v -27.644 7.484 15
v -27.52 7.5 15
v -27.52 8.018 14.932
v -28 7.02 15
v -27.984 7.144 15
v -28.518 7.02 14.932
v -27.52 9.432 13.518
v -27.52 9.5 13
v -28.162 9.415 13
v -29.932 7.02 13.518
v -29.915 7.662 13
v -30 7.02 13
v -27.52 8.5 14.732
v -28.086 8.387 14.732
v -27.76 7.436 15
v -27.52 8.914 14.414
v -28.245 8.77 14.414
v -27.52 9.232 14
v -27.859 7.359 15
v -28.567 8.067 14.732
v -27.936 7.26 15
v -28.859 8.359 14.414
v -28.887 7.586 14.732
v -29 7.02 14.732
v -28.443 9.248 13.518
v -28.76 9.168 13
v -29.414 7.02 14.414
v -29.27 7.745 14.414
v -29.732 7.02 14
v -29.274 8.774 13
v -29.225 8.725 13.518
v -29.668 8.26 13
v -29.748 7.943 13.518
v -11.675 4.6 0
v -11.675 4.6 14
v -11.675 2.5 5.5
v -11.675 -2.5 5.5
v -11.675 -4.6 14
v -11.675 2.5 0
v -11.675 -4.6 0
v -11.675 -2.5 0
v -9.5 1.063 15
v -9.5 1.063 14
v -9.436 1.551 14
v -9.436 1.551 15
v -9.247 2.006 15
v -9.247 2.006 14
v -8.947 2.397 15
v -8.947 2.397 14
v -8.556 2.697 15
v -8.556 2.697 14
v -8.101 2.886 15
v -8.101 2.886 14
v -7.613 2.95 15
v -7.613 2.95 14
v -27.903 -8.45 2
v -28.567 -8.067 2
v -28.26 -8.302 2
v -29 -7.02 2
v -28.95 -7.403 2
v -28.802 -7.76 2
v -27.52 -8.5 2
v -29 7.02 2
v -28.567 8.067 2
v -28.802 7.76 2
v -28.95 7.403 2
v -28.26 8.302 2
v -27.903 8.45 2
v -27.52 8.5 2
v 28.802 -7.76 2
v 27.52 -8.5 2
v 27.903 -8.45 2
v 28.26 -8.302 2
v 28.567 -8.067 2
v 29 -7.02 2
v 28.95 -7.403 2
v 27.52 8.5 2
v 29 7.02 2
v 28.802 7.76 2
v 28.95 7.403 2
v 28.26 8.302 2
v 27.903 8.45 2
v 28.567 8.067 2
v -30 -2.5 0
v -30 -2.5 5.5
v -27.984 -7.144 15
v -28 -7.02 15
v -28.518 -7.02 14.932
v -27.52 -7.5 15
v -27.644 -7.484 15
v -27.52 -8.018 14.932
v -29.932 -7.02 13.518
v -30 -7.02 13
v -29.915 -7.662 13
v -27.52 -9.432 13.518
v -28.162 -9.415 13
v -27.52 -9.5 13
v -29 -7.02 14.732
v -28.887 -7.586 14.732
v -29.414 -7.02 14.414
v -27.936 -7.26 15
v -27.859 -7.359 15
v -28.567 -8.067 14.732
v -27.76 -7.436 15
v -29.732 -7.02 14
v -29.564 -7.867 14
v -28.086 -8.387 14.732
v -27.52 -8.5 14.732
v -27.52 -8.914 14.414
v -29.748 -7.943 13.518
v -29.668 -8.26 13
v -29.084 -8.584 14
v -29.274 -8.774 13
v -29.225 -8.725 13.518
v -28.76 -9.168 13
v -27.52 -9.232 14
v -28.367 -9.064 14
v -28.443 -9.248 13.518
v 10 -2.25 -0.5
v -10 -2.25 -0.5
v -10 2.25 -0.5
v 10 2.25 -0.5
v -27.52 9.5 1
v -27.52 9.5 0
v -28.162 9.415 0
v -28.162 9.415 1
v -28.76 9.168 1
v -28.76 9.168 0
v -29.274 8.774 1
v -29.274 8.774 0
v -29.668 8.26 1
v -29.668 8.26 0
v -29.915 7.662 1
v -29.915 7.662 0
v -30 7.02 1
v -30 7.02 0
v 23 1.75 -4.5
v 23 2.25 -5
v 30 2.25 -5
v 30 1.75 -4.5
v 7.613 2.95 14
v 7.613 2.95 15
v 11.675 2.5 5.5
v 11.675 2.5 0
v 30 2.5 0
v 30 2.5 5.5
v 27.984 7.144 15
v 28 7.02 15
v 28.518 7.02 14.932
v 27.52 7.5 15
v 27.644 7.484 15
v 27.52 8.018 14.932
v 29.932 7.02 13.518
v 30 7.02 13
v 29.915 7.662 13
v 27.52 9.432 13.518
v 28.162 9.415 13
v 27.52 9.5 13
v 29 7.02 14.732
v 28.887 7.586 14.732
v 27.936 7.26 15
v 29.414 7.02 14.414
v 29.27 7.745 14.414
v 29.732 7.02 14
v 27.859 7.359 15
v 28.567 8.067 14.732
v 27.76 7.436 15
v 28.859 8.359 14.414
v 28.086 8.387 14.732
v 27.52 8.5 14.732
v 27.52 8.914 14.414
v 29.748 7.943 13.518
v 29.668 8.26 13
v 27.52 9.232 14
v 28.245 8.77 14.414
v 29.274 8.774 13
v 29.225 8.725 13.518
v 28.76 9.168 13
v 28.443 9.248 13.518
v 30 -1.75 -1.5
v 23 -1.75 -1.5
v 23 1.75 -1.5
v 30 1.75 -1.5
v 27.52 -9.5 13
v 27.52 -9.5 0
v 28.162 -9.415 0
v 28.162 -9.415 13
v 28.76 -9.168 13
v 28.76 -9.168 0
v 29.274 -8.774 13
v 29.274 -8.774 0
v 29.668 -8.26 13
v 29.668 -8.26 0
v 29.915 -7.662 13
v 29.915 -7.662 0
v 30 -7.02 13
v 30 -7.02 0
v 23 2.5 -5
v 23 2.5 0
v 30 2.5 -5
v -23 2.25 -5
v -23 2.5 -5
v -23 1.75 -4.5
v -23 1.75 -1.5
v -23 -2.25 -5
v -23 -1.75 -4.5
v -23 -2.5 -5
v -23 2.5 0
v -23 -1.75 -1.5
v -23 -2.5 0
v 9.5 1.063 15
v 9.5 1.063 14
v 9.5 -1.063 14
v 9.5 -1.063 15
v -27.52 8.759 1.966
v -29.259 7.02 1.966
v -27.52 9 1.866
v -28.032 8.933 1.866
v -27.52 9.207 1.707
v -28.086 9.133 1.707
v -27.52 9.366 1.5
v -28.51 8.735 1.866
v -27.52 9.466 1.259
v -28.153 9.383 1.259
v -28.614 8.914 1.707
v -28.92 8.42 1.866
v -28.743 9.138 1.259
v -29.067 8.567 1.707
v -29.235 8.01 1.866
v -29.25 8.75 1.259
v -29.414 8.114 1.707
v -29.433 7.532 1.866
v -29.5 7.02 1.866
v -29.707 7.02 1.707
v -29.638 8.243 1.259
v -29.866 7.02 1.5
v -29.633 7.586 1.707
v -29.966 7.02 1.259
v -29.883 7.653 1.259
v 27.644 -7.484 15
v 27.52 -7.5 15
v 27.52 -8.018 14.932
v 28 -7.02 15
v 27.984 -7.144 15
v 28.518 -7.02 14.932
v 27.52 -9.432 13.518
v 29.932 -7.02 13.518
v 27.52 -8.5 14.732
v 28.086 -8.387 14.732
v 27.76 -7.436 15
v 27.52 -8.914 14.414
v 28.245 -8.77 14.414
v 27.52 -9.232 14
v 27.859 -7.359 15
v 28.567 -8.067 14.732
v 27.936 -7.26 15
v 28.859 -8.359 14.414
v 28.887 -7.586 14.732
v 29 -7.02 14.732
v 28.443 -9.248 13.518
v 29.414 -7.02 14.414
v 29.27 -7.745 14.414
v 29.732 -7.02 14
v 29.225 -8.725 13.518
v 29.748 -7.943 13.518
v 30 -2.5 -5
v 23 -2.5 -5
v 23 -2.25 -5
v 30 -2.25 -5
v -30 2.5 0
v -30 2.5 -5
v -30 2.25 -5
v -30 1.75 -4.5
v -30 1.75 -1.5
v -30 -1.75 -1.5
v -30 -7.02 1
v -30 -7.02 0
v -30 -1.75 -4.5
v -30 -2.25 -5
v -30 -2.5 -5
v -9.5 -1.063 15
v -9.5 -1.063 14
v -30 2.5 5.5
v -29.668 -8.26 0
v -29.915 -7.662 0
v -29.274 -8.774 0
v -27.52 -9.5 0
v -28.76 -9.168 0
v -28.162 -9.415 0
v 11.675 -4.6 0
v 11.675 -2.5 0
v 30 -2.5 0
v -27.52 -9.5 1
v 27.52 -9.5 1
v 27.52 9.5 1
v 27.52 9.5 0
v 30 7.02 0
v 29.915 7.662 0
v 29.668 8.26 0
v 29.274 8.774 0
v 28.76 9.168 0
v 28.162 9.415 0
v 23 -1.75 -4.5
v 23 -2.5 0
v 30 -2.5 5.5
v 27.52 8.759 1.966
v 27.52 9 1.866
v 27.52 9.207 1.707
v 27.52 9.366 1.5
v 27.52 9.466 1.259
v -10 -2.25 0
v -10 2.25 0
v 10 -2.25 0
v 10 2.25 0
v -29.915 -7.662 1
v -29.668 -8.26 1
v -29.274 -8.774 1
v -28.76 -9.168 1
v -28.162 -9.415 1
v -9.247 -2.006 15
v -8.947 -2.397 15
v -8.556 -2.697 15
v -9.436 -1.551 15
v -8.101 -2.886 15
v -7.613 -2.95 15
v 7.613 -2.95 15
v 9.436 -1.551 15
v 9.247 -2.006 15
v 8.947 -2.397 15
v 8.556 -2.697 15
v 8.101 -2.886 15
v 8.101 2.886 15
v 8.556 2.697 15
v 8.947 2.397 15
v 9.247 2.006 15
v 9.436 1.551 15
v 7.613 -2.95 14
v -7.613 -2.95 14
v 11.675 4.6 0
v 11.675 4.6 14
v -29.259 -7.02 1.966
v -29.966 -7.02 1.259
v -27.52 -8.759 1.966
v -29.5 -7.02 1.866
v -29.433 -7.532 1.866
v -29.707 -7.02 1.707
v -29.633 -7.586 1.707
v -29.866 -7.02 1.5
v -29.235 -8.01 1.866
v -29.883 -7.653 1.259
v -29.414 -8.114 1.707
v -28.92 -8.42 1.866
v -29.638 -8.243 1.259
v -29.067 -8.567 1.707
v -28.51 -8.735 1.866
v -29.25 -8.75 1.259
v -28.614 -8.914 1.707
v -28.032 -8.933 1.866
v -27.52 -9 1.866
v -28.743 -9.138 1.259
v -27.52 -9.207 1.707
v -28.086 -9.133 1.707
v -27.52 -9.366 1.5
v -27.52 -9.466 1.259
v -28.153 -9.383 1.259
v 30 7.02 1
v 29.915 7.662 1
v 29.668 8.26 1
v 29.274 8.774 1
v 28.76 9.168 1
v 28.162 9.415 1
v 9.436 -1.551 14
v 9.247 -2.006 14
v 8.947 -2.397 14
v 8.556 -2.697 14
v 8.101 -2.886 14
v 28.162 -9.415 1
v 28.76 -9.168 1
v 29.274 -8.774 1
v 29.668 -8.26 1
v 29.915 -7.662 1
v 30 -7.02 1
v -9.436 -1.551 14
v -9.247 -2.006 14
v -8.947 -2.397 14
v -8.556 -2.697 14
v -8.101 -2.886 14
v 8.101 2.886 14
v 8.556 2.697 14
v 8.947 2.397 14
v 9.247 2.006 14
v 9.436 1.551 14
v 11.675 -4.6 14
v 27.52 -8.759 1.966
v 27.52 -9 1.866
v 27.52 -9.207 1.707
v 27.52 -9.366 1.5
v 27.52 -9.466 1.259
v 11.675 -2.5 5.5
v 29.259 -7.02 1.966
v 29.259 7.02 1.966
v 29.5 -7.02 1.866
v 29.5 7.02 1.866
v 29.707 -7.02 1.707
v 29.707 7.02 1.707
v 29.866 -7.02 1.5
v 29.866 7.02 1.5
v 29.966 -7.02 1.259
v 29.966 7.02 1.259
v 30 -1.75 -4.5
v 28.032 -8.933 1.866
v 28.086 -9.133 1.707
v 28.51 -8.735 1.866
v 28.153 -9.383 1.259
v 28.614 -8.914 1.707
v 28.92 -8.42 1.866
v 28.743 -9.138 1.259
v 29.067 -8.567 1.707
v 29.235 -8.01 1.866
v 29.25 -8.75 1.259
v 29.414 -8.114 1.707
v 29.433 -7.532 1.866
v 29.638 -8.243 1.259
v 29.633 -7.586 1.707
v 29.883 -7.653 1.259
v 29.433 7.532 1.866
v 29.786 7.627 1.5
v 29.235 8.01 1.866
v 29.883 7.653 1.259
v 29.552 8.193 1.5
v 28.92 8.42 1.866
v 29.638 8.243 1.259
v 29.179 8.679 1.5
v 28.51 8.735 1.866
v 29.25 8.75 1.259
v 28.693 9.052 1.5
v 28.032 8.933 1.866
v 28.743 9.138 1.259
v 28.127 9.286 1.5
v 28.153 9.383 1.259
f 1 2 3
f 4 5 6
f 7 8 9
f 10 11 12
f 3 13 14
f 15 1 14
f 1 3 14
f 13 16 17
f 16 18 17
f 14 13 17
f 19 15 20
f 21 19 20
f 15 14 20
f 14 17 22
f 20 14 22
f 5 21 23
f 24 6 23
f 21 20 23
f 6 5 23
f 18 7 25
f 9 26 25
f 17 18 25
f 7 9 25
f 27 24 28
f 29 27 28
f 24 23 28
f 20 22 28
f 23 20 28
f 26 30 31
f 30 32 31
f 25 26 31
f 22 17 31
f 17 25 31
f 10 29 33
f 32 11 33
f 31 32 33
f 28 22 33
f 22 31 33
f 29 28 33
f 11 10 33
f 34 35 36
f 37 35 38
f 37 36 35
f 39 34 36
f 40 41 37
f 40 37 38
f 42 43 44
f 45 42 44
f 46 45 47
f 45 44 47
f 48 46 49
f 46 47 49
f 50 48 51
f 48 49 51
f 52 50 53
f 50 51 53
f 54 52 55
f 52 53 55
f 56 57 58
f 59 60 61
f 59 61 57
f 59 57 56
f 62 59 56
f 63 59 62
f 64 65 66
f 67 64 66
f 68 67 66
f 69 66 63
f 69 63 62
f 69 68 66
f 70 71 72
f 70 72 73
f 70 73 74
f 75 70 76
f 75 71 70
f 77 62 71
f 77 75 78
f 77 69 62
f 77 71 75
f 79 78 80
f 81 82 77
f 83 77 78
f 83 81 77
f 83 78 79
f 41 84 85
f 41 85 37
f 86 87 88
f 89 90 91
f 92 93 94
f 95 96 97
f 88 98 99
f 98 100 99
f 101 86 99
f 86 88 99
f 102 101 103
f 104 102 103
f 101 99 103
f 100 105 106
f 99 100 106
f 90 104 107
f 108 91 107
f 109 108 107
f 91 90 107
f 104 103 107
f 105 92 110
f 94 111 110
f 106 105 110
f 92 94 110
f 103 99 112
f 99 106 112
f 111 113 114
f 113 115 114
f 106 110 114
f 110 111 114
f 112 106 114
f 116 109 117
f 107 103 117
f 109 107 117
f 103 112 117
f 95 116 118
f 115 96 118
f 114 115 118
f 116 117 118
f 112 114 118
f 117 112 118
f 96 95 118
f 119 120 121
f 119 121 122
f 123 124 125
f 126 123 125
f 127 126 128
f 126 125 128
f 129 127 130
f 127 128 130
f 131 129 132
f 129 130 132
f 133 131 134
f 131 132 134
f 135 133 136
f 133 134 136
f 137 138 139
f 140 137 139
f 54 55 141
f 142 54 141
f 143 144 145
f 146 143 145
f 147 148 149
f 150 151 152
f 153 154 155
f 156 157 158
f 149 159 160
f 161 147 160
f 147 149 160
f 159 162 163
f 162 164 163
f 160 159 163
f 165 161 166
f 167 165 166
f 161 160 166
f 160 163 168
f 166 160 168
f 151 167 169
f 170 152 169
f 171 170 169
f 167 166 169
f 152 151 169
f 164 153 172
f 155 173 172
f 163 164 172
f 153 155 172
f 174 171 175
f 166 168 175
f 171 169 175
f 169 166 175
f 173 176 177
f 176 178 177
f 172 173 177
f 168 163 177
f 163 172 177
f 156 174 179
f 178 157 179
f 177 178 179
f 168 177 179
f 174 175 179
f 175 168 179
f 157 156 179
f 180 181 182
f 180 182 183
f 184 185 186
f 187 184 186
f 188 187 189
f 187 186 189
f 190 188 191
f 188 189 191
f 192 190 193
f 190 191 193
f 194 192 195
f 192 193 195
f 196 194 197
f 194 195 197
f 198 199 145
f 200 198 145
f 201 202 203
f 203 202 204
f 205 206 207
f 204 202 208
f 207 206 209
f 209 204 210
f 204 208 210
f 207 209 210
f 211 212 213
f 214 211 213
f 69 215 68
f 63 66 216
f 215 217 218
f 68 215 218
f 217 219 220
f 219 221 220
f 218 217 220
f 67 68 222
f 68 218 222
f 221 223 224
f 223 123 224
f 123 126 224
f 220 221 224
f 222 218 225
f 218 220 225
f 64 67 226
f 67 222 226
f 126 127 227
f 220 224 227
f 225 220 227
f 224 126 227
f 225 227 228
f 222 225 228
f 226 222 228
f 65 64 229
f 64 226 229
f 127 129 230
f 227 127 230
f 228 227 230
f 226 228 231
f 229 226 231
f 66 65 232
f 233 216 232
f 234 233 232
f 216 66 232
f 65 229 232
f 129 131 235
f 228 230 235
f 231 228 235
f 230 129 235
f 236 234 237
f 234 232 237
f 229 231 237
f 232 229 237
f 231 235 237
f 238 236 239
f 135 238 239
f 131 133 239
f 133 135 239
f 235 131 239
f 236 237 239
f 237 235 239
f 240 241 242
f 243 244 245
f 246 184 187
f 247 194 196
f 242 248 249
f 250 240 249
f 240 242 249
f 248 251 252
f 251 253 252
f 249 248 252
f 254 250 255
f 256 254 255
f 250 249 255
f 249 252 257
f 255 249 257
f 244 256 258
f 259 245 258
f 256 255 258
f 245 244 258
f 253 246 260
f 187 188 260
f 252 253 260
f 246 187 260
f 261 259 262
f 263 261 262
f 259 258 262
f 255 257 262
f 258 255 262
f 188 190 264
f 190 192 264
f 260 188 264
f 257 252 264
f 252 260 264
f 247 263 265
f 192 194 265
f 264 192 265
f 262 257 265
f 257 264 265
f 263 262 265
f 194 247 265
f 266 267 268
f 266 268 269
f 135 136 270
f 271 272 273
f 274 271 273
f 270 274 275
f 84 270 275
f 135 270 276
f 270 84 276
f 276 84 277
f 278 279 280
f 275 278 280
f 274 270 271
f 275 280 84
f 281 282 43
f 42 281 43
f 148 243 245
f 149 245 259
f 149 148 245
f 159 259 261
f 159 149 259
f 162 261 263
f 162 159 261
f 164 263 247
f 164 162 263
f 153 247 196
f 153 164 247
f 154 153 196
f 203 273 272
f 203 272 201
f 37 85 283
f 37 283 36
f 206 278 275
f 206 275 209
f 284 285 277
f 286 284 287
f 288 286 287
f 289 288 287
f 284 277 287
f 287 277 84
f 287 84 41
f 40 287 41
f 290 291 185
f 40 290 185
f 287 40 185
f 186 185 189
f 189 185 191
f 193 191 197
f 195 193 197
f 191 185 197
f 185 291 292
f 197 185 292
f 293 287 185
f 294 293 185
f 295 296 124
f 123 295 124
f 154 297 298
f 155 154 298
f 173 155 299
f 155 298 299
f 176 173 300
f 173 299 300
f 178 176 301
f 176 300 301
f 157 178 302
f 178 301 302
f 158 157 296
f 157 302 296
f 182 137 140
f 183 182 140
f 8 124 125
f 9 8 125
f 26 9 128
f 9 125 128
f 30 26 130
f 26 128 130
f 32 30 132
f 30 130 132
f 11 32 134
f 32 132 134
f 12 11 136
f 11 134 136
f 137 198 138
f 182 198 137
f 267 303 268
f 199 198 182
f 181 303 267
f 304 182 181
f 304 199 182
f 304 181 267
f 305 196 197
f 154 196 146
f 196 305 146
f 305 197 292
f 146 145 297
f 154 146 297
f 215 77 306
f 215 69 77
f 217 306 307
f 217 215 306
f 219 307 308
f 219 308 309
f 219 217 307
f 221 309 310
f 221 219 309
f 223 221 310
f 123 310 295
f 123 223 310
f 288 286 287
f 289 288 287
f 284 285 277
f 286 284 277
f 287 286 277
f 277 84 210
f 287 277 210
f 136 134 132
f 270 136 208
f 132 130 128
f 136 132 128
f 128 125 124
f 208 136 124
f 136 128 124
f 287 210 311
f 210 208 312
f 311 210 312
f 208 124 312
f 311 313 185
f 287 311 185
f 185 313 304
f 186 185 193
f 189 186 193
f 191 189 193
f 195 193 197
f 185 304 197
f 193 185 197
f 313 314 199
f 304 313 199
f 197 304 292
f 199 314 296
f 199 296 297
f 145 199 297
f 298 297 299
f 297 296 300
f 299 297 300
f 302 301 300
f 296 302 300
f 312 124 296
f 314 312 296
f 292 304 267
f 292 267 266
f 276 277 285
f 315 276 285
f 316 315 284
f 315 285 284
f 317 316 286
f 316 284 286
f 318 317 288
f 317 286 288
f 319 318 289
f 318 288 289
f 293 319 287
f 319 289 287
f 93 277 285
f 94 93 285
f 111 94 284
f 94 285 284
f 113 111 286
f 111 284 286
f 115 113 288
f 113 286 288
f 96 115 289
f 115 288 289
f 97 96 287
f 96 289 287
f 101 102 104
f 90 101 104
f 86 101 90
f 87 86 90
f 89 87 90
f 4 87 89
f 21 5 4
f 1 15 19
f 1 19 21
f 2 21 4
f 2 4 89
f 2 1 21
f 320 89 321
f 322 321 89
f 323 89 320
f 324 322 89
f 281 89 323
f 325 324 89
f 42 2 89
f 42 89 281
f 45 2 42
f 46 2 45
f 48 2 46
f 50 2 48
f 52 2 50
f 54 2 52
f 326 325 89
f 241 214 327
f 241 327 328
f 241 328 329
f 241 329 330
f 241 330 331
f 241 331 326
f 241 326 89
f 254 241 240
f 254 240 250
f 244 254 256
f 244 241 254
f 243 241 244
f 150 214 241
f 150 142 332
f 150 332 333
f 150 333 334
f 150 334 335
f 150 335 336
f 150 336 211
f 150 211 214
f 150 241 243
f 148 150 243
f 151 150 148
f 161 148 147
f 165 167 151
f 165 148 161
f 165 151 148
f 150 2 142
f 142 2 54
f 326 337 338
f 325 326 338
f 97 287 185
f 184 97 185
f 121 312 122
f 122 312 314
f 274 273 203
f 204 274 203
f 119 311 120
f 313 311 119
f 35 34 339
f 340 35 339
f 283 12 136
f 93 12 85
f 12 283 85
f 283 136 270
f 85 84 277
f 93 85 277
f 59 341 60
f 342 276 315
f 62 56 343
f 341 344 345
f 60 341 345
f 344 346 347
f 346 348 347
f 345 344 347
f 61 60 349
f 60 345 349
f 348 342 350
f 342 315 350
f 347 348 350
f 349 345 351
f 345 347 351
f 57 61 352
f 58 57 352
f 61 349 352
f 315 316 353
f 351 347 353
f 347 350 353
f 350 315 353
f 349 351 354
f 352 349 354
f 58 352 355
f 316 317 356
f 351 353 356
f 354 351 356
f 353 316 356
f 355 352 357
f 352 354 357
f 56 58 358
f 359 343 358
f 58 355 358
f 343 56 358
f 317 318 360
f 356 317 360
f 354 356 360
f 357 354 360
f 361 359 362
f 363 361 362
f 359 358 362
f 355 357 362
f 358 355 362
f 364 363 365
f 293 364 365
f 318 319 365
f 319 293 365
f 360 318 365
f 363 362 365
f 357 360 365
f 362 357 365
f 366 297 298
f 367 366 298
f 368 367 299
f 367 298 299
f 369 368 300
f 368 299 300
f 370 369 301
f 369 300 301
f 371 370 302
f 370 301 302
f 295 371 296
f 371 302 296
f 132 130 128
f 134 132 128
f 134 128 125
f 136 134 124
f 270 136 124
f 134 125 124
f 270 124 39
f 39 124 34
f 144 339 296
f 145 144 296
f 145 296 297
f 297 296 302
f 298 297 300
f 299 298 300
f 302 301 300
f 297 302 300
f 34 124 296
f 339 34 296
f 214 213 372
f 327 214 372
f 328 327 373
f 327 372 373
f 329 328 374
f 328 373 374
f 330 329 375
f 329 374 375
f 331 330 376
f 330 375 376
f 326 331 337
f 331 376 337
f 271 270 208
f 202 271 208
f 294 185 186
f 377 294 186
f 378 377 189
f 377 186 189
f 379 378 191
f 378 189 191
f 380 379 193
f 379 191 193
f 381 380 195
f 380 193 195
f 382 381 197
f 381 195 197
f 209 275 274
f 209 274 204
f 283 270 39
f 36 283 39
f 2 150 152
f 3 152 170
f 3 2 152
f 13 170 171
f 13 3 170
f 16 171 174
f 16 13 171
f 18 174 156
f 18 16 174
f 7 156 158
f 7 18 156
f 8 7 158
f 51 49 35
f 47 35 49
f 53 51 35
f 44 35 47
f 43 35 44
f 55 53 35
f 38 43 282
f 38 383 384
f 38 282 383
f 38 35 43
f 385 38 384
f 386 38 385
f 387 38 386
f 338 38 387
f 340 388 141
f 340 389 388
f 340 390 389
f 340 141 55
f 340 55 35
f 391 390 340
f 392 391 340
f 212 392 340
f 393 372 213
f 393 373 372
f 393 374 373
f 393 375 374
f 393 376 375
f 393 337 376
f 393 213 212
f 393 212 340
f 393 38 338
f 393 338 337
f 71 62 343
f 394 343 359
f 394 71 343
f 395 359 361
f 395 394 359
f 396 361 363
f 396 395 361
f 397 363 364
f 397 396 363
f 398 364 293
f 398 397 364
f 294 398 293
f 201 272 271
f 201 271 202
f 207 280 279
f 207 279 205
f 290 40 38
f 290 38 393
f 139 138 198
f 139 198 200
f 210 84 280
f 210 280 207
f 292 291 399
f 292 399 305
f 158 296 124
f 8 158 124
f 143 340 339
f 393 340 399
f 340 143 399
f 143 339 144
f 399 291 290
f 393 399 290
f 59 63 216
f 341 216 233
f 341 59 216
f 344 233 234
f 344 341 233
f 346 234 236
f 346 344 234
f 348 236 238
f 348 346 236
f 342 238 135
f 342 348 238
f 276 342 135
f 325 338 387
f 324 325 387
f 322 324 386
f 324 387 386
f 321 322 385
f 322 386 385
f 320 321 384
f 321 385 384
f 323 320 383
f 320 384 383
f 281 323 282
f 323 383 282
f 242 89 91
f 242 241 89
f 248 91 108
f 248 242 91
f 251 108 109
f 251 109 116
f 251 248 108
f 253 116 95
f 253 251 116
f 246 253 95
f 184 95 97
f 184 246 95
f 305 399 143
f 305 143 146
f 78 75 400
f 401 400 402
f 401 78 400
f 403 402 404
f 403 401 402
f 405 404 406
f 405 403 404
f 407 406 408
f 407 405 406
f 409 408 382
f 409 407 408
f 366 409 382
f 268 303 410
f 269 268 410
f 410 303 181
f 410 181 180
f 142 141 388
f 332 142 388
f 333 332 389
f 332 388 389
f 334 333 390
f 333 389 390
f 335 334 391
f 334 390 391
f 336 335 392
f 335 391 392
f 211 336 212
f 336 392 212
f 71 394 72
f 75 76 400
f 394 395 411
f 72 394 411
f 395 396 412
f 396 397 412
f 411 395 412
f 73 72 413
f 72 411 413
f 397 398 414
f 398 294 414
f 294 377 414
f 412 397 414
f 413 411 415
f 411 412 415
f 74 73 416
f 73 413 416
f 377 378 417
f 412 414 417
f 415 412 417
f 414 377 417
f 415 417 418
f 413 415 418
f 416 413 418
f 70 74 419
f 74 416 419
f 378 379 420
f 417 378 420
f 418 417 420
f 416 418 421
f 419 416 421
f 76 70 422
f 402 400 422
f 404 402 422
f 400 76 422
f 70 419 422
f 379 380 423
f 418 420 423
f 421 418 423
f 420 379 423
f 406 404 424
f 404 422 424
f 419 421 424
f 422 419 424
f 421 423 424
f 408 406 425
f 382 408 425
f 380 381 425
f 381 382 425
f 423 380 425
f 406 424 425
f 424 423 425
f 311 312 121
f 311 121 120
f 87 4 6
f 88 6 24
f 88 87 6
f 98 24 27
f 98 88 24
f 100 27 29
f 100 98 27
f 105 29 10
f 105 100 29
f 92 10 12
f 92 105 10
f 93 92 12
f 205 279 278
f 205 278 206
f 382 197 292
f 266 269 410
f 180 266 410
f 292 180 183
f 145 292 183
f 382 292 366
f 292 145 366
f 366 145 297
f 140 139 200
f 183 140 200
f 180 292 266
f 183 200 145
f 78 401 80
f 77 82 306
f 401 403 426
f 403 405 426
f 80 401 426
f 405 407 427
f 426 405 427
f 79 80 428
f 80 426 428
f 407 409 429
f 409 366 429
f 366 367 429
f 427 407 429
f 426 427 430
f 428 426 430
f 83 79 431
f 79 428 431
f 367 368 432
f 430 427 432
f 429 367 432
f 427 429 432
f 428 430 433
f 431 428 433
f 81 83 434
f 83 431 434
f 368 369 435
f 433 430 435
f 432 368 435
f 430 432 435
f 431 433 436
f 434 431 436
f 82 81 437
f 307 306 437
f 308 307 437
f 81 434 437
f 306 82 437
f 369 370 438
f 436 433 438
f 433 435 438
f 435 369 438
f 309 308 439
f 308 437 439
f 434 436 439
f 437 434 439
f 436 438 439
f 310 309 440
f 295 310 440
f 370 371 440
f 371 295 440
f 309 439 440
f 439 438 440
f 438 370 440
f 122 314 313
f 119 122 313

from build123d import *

# Parameters (mm, degrees)
PAD_DEPTH       = 15
SKETCH001_W     = 23.35
SKETCH001_H     = 9.2
POCKET_DEPTH    = 14
POCKET001_DEPTH = 1.001
SKETCH003_W     = 18.6
SKETCH003_H     = 5
POCKET002_DEPTH = 5.5
FILLET_R        = 2
PAD001_DEPTH    = 2
SKETCH005_W     = 7
SKETCH005_H     = 5
PAD002_DEPTH    = 5
SKETCH007_W     = 20
SKETCH007_H     = 4.5
PAD003_DEPTH    = 0.5
FILLET001_R     = 1
SKETCH008_W     = 7
SKETCH008_H     = 3.5
POCKET003_DEPTH = 3.5
CHAMFER_SIZE    = 0.5


with BuildPart() as body:
    # Sketch → Pad (new body)
    with BuildSketch(Plane.XY):
        with BuildLine():
            Line((-30, 7.02), (-30, -7.02))
            ThreePointArc((-30, -7.02), (-29.273625, -8.773625), (-27.52, -9.5))
            Line((-27.52, -9.5), (27.52, -9.5))
            ThreePointArc((27.52, -9.5), (29.273625, -8.773625), (30, -7.02))
            Line((30, -7.02), (30, 7.02))
            ThreePointArc((30, 7.02), (29.273625, 8.773625), (27.52, 9.5))
            Line((27.52, 9.5), (-27.52, 9.5))
            ThreePointArc((-27.52, 9.5), (-29.273625, 8.773625), (-30, 7.02))
        make_face()
    extrude(amount=PAD_DEPTH)

    # Sketch001 (on Face9 of Pad) → Pocket (cut)
    with BuildSketch(Plane(origin=(0, 0, 0), x_dir=(1, 0, 0), z_dir=(0, 0, -1))):
        Rectangle(SKETCH001_W, SKETCH001_H)
    extrude(amount=-POCKET_DEPTH, mode=Mode.SUBTRACT)

    # Sketch002 (on Face15 of Pocket) → Pocket001 (cut, through all)
    with BuildSketch(Plane(origin=(0, 0, 14), x_dir=(1, 0, 0), z_dir=(0, 0, -1))):
        with BuildLine():
            Line((-9.5, 1.062611), (-9.5, -1.062611))
            ThreePointArc((-9.5, -1.062611), (-8.947197, -2.397197), (-7.612611, -2.95))
            Line((-7.612611, -2.95), (7.612611, -2.95))
            ThreePointArc((7.612611, -2.95), (8.947197, -2.397197), (9.5, -1.062611))
            Line((9.5, -1.062611), (9.5, 1.062611))
            ThreePointArc((9.5, 1.062611), (8.947197, 2.397197), (7.612611, 2.95))
            Line((7.612611, 2.95), (-7.612611, 2.95))
            ThreePointArc((-7.612611, 2.95), (-8.947197, 2.397197), (-9.5, 1.062611))
        make_face()
    extrude(amount=-POCKET001_DEPTH, mode=Mode.SUBTRACT)

    # Sketch003 (on Face4 of Pocket001) → Pocket002 (cut)
    with BuildSketch(Plane(origin=(0, 0, 0), x_dir=(1, 0, 0), z_dir=(0, 0, -1))):
        with Locations((-20.8, 0)):
            Rectangle(SKETCH003_W, SKETCH003_H)
        with Locations((20.8, 0)):
            Rectangle(SKETCH003_W, SKETCH003_H)
    extrude(amount=-POCKET002_DEPTH, mode=Mode.SUBTRACT)

    # Fillet
    fillet_edges = [body.edges().sort_by_distance(p)[0] for p in [
        (0, -9.5, 15),
        (0, 9.5, 15),
    ]]
    fillet(fillet_edges, radius=FILLET_R)


with BuildPart() as body001:
    # Sketch004 → Pad001 (new body)
    with BuildSketch(Plane.XY):
        with BuildLine():
            Line((-30, 7.02), (-30, -7.02))
            ThreePointArc((-30, -7.02), (-29.273625, -8.773625), (-27.52, -9.5))
            Line((-27.52, -9.5), (27.52, -9.5))
            ThreePointArc((27.52, -9.5), (29.273625, -8.773625), (30, -7.02))
            Line((30, -7.02), (30, 7.02))
            ThreePointArc((30, 7.02), (29.273625, 8.773625), (27.52, 9.5))
            Line((27.52, 9.5), (-27.52, 9.5))
            ThreePointArc((-27.52, 9.5), (-29.273625, 8.773625), (-30, 7.02))
        make_face()
    extrude(amount=PAD001_DEPTH)

    # Sketch005 (on Face9 of Pad001) → Pad002 (join)
    with BuildSketch(Plane(origin=(0, 0, 0), x_dir=(1, 0, 0), z_dir=(0, 0, -1))):
        with Locations((-26.5, 0)):
            Rectangle(SKETCH005_W, SKETCH005_H)
        with Locations((26.5, 0)):
            Rectangle(SKETCH005_W, SKETCH005_H)
    extrude(amount=PAD002_DEPTH)

    # Sketch007 → Pad003 (join)
    with BuildSketch(Plane(origin=(0, 0, 0), x_dir=(1, 0, 0), z_dir=(0, 0, -1))):
        Rectangle(SKETCH007_W, SKETCH007_H)
    extrude(amount=PAD003_DEPTH)

    # Fillet001
    fillet001_edges = [body001.edges().sort_by_distance(p)[0] for p in [
        (0, 9.5, 2),
        (0, -9.5, 2),
    ]]
    fillet(fillet001_edges, radius=FILLET001_R)

    # Sketch008 (on DatumPlane) → Pocket003 (cut)
    with BuildSketch(Plane(origin=(0, 0, -5), x_dir=(1, 0, 0), z_dir=(0, 0, -1))):
        with Locations((-26.5, 0)):
            Rectangle(SKETCH008_W, SKETCH008_H)
        with Locations((26.5, 0)):
            Rectangle(SKETCH008_W, SKETCH008_H)
    extrude(amount=-POCKET003_DEPTH, mode=Mode.SUBTRACT)

    # Chamfer
    chamfer_edges = [body001.edges().sort_by_distance(p)[0] for p in [
        (26.5, -1.75, -5),
        (26.5, 1.75, -5),
        (-26.5, 1.75, -5),
        (-26.5, -1.75, -5),
    ]]
    chamfer(chamfer_edges, length=CHAMFER_SIZE)


solid = Compound([body.part, body001.part])
